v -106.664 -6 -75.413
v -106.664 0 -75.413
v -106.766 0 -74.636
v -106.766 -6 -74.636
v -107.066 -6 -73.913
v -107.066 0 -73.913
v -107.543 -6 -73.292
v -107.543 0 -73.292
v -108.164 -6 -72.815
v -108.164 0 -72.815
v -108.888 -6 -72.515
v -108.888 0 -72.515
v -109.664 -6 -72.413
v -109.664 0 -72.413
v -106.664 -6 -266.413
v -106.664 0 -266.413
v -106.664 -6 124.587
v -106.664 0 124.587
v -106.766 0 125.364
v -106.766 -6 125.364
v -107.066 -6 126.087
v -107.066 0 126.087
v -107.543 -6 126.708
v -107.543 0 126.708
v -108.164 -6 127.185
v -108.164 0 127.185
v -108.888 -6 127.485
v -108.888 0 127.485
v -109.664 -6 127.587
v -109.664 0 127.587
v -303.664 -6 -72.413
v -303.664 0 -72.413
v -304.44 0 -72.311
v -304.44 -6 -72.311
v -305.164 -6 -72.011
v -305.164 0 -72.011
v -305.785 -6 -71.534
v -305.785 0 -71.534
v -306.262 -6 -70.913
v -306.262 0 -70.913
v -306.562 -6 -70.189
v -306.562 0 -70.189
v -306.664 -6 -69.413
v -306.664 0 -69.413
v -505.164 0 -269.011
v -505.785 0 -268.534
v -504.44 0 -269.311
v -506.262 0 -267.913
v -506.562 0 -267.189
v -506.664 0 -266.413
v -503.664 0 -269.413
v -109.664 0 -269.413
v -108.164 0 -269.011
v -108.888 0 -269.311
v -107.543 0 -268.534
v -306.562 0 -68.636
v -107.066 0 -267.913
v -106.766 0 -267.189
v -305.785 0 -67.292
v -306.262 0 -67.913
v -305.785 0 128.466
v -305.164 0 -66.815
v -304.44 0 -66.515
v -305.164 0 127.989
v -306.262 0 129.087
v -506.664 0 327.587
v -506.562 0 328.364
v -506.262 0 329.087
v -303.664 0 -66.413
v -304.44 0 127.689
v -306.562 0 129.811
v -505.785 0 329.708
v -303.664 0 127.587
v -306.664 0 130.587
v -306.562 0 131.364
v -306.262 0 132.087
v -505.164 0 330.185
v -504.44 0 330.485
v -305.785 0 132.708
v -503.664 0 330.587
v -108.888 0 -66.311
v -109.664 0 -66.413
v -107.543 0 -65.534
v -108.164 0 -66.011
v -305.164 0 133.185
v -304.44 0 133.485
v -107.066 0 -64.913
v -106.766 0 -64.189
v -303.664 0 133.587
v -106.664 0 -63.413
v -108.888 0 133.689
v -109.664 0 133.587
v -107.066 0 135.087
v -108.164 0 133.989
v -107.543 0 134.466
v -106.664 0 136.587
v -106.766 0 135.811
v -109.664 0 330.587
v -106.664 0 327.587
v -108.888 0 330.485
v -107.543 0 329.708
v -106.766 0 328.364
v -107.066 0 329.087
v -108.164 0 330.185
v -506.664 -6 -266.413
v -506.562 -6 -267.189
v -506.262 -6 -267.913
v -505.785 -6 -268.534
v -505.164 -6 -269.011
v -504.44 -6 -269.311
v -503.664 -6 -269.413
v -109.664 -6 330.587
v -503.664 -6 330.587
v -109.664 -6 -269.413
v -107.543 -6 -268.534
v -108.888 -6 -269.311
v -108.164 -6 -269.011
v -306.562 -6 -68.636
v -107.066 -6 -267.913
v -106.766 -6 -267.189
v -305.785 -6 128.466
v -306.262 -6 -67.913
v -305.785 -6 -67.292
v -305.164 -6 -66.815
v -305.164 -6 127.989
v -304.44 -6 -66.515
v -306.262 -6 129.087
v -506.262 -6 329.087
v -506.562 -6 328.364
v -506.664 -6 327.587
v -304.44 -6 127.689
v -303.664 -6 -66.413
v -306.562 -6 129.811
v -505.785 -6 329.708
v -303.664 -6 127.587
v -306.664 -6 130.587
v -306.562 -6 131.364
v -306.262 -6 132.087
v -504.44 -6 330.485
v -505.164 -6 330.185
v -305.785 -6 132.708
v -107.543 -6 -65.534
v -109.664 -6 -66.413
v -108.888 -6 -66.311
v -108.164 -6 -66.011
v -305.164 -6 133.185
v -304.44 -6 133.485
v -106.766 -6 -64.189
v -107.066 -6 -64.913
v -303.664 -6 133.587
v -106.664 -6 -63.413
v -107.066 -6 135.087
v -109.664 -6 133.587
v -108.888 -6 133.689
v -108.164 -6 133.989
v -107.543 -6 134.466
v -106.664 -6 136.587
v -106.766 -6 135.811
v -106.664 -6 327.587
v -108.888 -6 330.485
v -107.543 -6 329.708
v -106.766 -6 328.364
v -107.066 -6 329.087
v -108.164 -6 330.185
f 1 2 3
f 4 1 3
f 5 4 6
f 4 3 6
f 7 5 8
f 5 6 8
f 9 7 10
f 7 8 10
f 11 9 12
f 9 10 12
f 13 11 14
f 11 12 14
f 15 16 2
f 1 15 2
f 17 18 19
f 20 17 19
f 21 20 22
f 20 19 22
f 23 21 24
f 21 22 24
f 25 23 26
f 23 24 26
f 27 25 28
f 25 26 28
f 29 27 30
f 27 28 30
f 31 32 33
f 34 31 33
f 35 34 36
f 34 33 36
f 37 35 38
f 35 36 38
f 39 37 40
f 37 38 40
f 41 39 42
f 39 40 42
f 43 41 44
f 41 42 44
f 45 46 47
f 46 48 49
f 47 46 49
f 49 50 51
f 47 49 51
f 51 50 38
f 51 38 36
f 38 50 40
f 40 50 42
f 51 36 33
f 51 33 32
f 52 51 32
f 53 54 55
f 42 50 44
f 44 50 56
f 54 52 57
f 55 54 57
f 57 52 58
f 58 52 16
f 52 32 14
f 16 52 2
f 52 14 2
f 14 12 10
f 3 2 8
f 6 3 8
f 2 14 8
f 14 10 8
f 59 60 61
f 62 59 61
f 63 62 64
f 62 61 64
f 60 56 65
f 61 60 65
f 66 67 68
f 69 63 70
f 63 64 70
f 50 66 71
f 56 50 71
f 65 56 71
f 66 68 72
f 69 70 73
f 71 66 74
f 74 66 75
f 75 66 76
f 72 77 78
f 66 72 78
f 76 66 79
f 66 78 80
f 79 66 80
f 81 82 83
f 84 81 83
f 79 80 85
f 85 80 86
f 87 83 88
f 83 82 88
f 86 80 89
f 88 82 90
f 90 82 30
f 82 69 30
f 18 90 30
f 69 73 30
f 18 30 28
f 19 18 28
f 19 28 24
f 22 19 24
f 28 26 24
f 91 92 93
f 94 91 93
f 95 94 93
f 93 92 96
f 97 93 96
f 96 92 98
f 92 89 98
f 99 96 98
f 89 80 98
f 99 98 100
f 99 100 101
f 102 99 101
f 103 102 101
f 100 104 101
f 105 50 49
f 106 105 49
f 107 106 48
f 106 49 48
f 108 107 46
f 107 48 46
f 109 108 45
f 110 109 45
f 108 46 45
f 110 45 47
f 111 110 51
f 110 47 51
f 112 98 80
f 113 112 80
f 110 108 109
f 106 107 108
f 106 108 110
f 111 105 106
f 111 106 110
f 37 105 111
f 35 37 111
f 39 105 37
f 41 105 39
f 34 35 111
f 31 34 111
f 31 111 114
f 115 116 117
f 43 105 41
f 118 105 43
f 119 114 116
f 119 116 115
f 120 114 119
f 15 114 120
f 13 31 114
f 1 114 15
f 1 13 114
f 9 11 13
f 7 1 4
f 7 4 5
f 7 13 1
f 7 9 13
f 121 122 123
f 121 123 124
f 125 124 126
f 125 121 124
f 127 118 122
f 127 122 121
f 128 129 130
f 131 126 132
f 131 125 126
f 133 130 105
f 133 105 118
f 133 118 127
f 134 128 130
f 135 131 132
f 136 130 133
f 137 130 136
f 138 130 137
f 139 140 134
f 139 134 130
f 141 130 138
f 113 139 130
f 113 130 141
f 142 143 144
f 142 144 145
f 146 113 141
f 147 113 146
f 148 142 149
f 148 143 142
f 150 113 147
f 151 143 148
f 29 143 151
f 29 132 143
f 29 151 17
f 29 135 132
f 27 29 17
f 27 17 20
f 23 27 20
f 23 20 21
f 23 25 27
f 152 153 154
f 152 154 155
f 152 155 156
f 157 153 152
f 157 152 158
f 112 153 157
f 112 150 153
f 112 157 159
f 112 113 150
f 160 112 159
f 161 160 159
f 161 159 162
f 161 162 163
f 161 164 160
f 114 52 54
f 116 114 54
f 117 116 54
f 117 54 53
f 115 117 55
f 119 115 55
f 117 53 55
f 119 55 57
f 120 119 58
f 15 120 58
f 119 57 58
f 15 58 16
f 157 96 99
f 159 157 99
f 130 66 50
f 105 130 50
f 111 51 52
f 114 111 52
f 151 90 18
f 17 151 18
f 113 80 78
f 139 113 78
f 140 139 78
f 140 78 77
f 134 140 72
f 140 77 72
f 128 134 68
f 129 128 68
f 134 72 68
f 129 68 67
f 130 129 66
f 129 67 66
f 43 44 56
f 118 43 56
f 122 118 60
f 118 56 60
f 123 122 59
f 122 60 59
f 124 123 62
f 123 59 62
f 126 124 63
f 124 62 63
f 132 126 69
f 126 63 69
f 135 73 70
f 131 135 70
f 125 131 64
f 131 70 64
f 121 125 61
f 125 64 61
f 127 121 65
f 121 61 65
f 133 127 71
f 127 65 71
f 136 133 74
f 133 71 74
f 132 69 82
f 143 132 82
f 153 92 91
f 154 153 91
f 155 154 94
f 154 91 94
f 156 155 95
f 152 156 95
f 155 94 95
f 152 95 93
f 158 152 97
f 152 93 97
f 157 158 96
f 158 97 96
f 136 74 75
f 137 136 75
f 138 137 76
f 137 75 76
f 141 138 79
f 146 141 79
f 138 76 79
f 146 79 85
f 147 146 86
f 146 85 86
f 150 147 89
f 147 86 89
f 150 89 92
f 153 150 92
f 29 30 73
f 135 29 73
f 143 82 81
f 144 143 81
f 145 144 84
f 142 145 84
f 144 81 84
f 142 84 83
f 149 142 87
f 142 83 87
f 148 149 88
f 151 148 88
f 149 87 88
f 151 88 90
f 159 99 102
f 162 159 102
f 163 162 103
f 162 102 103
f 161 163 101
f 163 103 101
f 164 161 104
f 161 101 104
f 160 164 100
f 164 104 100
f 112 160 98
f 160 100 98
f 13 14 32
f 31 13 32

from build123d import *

# Parameters (mm, degrees)
F1_DEPTH = 6


with BuildPart() as f1:
    # F0 (on Front) → F1 (new body)
    with BuildSketch(Plane.XZ):
        with BuildLine():
            Line((-109.664015, 330.587179), (-503.664015, 330.587179))
            ThreePointArc((-503.664015, 330.587179), (-505.785335, 329.708499), (-506.664015, 327.587179))
            Line((-506.664015, 327.587179), (-506.664015, -266.412821))
            ThreePointArc((-506.664015, -266.412821), (-505.785335, -268.534142), (-503.664015, -269.412821))
            Line((-503.664015, -269.412821), (-109.664015, -269.412821))
            ThreePointArc((-109.664015, -269.412821), (-107.542694, -268.534142), (-106.664015, -266.412821))
            Line((-106.664015, -266.412821), (-106.664015, -75.412821))
            ThreePointArc((-106.664015, -75.412821), (-107.542694, -73.291501), (-109.664015, -72.412821))
            Line((-109.664015, -72.412821), (-303.664015, -72.412821))
            ThreePointArc((-303.664015, -72.412821), (-305.785335, -71.534142), (-306.664015, -69.412821))
            ThreePointArc((-306.664015, -69.412821), (-305.785335, -67.291501), (-303.664015, -66.412821))
            Line((-303.664015, -66.412821), (-109.664015, -66.412821))
            ThreePointArc((-109.664015, -66.412821), (-107.542694, -65.534142), (-106.664015, -63.412821))
            Line((-106.664015, -63.412821), (-106.664015, 124.587179))
            ThreePointArc((-106.664015, 124.587179), (-107.542694, 126.708499), (-109.664015, 127.587179))
            Line((-109.664015, 127.587179), (-303.664015, 127.587179))
            ThreePointArc((-303.664015, 127.587179), (-305.785335, 128.465858), (-306.664015, 130.587179))
            ThreePointArc((-306.664015, 130.587179), (-305.785335, 132.708499), (-303.664015, 133.587179))
            Line((-303.664015, 133.587179), (-109.664015, 133.587179))
            ThreePointArc((-109.664015, 133.587179), (-107.542694, 134.465858), (-106.664015, 136.587179))
            Line((-106.664015, 136.587179), (-106.664015, 327.587179))
            ThreePointArc((-106.664015, 327.587179), (-107.542694, 329.708499), (-109.664015, 330.587179))
        make_face()
    extrude(amount=F1_DEPTH)


solid = f1.part
